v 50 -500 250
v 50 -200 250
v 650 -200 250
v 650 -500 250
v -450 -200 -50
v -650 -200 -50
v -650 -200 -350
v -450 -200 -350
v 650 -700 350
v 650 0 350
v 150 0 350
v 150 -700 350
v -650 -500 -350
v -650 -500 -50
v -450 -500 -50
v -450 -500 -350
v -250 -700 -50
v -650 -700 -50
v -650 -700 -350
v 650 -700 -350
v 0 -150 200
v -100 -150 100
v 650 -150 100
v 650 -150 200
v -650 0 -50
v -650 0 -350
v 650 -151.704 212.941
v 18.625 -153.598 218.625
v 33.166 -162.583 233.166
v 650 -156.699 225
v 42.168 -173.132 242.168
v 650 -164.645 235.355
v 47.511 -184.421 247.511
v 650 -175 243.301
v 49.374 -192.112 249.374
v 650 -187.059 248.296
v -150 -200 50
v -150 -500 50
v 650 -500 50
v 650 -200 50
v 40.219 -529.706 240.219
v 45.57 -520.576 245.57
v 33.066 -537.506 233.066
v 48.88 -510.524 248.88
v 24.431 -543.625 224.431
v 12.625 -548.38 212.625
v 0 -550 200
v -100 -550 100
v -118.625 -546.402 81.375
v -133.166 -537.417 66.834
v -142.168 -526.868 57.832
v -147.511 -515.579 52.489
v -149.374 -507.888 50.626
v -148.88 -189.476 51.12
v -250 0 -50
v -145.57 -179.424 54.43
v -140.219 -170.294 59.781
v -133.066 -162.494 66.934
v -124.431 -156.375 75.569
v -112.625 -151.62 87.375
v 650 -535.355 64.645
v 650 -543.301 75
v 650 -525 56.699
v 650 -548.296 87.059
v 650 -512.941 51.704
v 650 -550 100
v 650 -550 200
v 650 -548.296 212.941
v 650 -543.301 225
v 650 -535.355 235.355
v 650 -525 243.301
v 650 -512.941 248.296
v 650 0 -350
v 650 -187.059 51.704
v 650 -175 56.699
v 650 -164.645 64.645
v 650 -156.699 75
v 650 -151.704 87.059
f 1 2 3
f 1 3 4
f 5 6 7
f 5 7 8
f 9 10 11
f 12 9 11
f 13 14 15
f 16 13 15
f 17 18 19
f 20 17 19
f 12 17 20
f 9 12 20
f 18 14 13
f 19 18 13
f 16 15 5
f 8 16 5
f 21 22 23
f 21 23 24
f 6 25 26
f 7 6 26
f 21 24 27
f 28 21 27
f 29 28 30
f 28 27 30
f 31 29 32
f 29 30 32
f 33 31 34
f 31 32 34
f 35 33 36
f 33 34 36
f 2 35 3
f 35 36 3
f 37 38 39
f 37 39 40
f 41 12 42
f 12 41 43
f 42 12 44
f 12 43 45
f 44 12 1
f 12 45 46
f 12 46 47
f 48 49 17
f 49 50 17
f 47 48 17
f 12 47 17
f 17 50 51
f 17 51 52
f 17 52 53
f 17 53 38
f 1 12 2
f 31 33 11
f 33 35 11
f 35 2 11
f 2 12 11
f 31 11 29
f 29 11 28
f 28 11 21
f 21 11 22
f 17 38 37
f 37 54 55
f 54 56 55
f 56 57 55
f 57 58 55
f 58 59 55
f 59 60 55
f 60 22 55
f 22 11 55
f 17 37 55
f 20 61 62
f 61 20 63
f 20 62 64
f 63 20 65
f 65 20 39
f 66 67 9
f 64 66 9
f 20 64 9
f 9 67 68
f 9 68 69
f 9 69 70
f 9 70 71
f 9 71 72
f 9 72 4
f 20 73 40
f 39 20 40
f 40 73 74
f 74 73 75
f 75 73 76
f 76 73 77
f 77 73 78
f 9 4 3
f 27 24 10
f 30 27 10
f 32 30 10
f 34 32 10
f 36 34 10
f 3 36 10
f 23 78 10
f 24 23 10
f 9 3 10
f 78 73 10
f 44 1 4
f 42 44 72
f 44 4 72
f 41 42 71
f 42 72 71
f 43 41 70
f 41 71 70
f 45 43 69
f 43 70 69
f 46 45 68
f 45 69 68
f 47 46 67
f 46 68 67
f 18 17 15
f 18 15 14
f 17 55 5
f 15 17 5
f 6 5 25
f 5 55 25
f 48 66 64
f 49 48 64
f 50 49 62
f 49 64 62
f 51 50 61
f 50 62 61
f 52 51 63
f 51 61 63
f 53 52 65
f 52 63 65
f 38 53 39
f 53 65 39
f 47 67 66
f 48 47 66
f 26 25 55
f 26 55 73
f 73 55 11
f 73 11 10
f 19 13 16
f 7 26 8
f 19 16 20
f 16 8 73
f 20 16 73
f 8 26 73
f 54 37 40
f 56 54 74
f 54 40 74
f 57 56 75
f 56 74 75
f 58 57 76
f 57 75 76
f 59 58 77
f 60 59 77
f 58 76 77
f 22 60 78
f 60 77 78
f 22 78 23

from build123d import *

# Parameters (mm, degrees)
F1_DEPTH = 700
F3_DEPTH = 1300.001
F4_W     = 200
F4_H     = 300
F5_DEPTH = 300.001


with BuildPart() as f1:
    # F0 (on Front) → F1 (new body)
    with BuildSketch(Plane.XZ):
        Polygon((650, 350), (150, 350), (-250, -50), (-650, -50), (-650, -350), (650, -350), align=None)
    extrude(amount=F1_DEPTH)

    # F2 (on face) → F3 (cut, through all)
    with BuildSketch(Plane.YZ.offset(650)):
        with BuildLine():
            Line((-200, 250), (-500, 250))
            ThreePointArc((-500, 250), (-535.355339, 235.355339), (-550, 200))
            Line((-550, 200), (-550, 100))
            ThreePointArc((-550, 100), (-535.355339, 64.644661), (-500, 50))
            Line((-500, 50), (-200, 50))
            ThreePointArc((-200, 50), (-164.644661, 64.644661), (-150, 100))
            Line((-150, 100), (-150, 200))
            ThreePointArc((-150, 200), (-164.644661, 235.355339), (-200, 250))
        make_face()
    extrude(amount=-F3_DEPTH, mode=Mode.SUBTRACT)

    # F4 (on face) → F5 (cut, through all)
    with BuildSketch(Plane.XY.offset(-50)):
        with Locations((-550, -350)):
            Rectangle(F4_W, F4_H)
    extrude(amount=-F5_DEPTH, mode=Mode.SUBTRACT)


solid = f1.part
